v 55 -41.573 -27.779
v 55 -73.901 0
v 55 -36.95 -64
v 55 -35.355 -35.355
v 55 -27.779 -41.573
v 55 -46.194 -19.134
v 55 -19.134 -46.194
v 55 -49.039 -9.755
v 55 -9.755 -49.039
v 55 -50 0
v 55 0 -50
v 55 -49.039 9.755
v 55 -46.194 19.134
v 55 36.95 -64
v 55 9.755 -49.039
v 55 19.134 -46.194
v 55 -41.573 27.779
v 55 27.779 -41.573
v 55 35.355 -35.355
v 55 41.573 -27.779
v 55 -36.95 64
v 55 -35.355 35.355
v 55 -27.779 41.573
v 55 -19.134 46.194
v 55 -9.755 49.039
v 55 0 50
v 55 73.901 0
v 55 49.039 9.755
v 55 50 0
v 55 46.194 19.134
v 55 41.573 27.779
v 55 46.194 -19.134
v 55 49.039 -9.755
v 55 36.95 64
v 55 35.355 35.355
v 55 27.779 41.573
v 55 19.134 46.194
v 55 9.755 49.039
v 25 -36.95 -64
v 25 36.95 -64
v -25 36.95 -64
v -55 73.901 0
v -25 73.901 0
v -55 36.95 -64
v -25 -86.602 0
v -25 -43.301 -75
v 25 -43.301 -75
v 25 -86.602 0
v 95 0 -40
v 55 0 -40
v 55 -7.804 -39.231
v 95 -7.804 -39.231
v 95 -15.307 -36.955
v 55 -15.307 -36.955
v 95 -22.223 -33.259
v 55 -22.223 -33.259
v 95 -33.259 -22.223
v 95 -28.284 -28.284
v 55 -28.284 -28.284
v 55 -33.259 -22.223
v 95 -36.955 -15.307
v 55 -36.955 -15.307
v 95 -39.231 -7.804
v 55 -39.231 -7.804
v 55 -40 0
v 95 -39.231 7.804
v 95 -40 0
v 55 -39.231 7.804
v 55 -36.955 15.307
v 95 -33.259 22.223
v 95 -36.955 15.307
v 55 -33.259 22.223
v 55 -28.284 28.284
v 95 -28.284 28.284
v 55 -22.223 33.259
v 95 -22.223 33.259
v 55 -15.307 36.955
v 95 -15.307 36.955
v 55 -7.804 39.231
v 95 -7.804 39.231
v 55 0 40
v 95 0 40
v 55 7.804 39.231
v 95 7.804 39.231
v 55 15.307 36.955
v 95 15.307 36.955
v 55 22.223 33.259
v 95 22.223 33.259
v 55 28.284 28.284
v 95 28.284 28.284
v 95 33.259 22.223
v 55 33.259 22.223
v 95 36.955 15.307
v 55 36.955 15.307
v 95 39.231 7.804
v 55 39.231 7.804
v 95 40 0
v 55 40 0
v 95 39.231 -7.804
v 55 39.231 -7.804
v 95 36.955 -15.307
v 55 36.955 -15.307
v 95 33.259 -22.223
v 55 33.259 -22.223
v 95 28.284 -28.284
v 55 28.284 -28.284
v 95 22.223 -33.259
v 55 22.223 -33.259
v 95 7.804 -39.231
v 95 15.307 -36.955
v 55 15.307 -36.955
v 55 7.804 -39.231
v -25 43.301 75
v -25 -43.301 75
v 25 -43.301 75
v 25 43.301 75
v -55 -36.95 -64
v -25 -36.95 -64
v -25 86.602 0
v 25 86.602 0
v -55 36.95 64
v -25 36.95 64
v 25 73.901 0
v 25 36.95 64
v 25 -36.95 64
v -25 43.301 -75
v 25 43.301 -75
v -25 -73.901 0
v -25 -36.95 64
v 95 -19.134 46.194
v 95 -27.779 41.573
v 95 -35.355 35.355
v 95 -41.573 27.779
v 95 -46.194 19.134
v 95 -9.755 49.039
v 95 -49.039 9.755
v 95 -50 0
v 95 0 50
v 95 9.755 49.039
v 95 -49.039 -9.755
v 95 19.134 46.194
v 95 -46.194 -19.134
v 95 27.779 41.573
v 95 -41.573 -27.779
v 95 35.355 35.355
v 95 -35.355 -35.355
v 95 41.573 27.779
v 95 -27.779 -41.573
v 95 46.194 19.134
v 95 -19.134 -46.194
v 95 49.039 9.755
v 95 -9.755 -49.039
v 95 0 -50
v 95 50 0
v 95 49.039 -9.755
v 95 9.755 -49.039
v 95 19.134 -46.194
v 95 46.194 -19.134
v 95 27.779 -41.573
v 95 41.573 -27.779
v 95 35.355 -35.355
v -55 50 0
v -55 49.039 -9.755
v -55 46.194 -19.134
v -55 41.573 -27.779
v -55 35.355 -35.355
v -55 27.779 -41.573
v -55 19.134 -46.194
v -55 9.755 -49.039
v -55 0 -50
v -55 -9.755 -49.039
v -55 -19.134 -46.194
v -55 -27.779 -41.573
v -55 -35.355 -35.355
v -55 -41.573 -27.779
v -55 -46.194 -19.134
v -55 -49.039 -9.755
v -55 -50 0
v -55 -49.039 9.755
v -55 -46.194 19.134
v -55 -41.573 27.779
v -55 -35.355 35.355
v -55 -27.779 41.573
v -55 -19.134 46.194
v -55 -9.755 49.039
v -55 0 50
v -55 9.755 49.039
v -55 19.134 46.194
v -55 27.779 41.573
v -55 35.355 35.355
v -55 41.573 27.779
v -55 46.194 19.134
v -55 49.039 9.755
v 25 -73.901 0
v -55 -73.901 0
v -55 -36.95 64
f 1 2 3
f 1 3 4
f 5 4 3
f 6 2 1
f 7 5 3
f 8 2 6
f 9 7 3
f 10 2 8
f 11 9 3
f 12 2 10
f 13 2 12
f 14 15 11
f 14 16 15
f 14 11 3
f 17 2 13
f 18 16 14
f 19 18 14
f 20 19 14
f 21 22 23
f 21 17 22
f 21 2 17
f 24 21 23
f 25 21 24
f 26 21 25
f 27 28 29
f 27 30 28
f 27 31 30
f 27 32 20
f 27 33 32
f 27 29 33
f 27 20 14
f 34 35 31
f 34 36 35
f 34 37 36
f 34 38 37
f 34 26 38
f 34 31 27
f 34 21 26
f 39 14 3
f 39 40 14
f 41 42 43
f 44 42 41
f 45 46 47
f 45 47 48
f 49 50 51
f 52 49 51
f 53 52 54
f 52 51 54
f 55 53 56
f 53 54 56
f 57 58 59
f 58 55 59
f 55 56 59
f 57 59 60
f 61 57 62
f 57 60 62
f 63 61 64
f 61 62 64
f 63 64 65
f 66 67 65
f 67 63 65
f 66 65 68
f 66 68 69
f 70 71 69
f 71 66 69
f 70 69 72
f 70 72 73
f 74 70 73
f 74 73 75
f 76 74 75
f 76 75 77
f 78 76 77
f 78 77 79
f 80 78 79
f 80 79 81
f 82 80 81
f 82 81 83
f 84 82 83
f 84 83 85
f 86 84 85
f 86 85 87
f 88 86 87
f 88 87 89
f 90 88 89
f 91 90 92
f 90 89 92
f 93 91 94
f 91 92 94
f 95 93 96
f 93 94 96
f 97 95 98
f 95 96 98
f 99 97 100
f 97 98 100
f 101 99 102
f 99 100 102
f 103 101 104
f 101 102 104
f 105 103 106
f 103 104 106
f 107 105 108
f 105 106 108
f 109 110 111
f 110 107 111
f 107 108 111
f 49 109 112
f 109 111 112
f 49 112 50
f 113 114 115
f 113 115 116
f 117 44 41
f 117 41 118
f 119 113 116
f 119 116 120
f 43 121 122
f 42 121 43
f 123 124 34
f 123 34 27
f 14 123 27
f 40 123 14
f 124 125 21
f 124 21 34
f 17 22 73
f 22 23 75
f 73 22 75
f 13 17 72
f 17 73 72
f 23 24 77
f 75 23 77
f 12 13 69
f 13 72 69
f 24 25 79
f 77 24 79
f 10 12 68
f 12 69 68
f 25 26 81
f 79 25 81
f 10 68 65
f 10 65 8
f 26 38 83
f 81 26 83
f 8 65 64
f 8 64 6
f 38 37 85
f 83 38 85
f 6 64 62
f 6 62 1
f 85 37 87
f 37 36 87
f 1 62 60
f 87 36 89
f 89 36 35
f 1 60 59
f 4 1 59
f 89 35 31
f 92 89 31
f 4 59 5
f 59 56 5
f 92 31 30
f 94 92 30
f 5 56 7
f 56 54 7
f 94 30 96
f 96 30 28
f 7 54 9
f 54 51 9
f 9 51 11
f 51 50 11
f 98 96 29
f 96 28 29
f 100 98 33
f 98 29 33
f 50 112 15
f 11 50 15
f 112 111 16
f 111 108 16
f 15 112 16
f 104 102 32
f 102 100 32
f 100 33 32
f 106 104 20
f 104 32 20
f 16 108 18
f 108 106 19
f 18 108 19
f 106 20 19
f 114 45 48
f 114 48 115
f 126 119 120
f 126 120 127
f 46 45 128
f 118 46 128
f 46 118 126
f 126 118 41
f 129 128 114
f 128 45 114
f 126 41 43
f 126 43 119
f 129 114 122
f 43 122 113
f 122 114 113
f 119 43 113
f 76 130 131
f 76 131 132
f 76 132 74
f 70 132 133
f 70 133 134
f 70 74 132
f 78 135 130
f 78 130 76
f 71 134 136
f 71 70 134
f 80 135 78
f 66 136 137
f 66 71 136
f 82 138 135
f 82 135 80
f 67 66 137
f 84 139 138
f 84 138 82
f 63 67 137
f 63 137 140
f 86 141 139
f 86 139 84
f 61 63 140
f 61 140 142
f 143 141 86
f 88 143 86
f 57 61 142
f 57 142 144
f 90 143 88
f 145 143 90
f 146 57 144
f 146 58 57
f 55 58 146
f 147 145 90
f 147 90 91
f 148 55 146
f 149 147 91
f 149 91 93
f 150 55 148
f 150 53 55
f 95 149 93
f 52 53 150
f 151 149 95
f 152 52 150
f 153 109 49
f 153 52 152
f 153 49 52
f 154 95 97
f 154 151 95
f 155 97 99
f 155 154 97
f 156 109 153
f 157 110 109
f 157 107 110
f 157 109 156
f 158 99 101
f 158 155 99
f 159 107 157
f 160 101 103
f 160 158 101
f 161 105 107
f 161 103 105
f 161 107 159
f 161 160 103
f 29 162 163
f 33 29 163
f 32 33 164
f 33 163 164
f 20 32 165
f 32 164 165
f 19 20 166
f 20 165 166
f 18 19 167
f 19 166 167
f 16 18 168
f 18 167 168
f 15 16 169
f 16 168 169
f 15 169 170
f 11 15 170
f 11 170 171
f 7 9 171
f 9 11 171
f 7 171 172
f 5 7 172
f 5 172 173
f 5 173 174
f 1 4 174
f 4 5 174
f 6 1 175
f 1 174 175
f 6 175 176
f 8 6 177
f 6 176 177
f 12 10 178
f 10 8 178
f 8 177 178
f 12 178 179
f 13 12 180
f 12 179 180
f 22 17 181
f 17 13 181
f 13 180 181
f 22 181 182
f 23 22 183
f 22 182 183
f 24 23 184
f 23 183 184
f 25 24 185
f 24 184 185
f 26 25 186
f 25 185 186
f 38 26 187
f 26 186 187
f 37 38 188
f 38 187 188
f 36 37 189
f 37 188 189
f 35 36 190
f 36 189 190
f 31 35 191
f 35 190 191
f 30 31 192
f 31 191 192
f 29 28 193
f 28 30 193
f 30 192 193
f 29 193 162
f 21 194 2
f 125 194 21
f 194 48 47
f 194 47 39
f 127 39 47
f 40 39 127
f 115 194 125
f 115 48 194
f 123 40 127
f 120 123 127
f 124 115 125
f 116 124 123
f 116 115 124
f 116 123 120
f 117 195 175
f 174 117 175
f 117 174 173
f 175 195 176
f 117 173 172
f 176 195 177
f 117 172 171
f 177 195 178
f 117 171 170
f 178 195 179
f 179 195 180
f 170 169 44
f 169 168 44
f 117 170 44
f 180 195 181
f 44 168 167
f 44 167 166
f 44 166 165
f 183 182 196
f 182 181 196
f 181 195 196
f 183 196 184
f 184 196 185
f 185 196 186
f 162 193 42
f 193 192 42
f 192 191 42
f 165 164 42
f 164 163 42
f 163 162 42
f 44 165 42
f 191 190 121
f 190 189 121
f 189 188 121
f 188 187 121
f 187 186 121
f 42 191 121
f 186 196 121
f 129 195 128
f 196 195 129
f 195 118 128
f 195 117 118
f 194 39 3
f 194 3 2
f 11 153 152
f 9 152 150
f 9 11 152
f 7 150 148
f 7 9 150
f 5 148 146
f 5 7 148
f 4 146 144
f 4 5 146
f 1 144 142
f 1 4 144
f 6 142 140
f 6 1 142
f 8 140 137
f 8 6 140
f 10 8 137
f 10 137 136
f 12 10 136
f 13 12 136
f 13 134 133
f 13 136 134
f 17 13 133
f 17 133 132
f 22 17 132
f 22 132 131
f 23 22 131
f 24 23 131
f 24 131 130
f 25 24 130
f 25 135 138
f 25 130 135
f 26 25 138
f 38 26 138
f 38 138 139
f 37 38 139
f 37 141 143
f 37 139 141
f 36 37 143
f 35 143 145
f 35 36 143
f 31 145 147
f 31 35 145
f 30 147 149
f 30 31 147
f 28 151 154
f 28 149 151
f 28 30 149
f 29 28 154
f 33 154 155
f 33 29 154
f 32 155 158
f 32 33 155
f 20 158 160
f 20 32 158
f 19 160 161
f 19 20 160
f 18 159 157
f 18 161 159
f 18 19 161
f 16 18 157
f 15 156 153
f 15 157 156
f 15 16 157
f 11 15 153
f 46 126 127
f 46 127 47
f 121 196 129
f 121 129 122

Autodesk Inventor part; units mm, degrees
ref_plane "YZ Plane" through (0, 0, 0) normal (1, 0, 0) x (0, 1, 0)
ref_plane "XZ Plane" through (0, 0, 0) normal (0, 1, 0) x (-1, 0, 0)
ref_plane "XY Plane" through (0, 0, 0) normal (0, 0, 1) x (1, 0, 0)
sketch "Sketch1" plane through (0, 0, 0) normal (1, 0, 0) x (0, 1, 0)
  circle A0 centre (0, 0) radius 50
  line L0 (-36.9504, -64) -> (-73.9008, 0)
  line L1 (-73.9008, 0) -> (-36.9504, 64)
  line L2 (-36.9504, 64) -> (36.9504, 64)
  line L3 (36.9504, 64) -> (73.9008, 0)
  line L4 (73.9008, 0) -> (36.9504, -64)
  line L5 (36.9504, -64) -> (-36.9504, -64)
  dimension "d0" = 100
  dimension "d1" = 64
extrude "Extrusion1" add sketch "Sketch1" along normal mid plane 110
sketch "Sketch3" plane through (0, 0, 0) normal (1, 0, 0) x (0, 1, 0)
  line L0 (-43.3013, -75) -> (-86.6025, 0)
  line L1 (-86.6025, 0) -> (-43.3013, 75)
  line L2 (-43.3013, 75) -> (43.3013, 75)
  line L3 (43.3013, 75) -> (86.6025, 0)
  line L4 (86.6025, 0) -> (43.3013, -75)
  line L5 (43.3013, -75) -> (-43.3013, -75)
  circle A0 centre (0, 0) radius 50 projected
  dimension "d4" = 75
extrude "Extrusion2" add sketch "Sketch3" along normal mid plane 50
thread "Thread1" size "M100x6" class "6H" standard "ANSI Metric M Profile" full length
sketch "Sketch4" plane through (55, 0, 0) normal (1, 0, 0) x (0, 0, -1)
  circle A0 centre (0, 0) radius 50 projected
  circle A1 centre (0, 0) radius 40
  dimension "d12" = 10
extrude "Extrusion4" add sketch "Sketch4" along normal blind 40
thread "Thread2" size "M100x6" class "6g" standard "ANSI Metric M Profile" full length
properties part number "uniao assento conico 4 inch"
